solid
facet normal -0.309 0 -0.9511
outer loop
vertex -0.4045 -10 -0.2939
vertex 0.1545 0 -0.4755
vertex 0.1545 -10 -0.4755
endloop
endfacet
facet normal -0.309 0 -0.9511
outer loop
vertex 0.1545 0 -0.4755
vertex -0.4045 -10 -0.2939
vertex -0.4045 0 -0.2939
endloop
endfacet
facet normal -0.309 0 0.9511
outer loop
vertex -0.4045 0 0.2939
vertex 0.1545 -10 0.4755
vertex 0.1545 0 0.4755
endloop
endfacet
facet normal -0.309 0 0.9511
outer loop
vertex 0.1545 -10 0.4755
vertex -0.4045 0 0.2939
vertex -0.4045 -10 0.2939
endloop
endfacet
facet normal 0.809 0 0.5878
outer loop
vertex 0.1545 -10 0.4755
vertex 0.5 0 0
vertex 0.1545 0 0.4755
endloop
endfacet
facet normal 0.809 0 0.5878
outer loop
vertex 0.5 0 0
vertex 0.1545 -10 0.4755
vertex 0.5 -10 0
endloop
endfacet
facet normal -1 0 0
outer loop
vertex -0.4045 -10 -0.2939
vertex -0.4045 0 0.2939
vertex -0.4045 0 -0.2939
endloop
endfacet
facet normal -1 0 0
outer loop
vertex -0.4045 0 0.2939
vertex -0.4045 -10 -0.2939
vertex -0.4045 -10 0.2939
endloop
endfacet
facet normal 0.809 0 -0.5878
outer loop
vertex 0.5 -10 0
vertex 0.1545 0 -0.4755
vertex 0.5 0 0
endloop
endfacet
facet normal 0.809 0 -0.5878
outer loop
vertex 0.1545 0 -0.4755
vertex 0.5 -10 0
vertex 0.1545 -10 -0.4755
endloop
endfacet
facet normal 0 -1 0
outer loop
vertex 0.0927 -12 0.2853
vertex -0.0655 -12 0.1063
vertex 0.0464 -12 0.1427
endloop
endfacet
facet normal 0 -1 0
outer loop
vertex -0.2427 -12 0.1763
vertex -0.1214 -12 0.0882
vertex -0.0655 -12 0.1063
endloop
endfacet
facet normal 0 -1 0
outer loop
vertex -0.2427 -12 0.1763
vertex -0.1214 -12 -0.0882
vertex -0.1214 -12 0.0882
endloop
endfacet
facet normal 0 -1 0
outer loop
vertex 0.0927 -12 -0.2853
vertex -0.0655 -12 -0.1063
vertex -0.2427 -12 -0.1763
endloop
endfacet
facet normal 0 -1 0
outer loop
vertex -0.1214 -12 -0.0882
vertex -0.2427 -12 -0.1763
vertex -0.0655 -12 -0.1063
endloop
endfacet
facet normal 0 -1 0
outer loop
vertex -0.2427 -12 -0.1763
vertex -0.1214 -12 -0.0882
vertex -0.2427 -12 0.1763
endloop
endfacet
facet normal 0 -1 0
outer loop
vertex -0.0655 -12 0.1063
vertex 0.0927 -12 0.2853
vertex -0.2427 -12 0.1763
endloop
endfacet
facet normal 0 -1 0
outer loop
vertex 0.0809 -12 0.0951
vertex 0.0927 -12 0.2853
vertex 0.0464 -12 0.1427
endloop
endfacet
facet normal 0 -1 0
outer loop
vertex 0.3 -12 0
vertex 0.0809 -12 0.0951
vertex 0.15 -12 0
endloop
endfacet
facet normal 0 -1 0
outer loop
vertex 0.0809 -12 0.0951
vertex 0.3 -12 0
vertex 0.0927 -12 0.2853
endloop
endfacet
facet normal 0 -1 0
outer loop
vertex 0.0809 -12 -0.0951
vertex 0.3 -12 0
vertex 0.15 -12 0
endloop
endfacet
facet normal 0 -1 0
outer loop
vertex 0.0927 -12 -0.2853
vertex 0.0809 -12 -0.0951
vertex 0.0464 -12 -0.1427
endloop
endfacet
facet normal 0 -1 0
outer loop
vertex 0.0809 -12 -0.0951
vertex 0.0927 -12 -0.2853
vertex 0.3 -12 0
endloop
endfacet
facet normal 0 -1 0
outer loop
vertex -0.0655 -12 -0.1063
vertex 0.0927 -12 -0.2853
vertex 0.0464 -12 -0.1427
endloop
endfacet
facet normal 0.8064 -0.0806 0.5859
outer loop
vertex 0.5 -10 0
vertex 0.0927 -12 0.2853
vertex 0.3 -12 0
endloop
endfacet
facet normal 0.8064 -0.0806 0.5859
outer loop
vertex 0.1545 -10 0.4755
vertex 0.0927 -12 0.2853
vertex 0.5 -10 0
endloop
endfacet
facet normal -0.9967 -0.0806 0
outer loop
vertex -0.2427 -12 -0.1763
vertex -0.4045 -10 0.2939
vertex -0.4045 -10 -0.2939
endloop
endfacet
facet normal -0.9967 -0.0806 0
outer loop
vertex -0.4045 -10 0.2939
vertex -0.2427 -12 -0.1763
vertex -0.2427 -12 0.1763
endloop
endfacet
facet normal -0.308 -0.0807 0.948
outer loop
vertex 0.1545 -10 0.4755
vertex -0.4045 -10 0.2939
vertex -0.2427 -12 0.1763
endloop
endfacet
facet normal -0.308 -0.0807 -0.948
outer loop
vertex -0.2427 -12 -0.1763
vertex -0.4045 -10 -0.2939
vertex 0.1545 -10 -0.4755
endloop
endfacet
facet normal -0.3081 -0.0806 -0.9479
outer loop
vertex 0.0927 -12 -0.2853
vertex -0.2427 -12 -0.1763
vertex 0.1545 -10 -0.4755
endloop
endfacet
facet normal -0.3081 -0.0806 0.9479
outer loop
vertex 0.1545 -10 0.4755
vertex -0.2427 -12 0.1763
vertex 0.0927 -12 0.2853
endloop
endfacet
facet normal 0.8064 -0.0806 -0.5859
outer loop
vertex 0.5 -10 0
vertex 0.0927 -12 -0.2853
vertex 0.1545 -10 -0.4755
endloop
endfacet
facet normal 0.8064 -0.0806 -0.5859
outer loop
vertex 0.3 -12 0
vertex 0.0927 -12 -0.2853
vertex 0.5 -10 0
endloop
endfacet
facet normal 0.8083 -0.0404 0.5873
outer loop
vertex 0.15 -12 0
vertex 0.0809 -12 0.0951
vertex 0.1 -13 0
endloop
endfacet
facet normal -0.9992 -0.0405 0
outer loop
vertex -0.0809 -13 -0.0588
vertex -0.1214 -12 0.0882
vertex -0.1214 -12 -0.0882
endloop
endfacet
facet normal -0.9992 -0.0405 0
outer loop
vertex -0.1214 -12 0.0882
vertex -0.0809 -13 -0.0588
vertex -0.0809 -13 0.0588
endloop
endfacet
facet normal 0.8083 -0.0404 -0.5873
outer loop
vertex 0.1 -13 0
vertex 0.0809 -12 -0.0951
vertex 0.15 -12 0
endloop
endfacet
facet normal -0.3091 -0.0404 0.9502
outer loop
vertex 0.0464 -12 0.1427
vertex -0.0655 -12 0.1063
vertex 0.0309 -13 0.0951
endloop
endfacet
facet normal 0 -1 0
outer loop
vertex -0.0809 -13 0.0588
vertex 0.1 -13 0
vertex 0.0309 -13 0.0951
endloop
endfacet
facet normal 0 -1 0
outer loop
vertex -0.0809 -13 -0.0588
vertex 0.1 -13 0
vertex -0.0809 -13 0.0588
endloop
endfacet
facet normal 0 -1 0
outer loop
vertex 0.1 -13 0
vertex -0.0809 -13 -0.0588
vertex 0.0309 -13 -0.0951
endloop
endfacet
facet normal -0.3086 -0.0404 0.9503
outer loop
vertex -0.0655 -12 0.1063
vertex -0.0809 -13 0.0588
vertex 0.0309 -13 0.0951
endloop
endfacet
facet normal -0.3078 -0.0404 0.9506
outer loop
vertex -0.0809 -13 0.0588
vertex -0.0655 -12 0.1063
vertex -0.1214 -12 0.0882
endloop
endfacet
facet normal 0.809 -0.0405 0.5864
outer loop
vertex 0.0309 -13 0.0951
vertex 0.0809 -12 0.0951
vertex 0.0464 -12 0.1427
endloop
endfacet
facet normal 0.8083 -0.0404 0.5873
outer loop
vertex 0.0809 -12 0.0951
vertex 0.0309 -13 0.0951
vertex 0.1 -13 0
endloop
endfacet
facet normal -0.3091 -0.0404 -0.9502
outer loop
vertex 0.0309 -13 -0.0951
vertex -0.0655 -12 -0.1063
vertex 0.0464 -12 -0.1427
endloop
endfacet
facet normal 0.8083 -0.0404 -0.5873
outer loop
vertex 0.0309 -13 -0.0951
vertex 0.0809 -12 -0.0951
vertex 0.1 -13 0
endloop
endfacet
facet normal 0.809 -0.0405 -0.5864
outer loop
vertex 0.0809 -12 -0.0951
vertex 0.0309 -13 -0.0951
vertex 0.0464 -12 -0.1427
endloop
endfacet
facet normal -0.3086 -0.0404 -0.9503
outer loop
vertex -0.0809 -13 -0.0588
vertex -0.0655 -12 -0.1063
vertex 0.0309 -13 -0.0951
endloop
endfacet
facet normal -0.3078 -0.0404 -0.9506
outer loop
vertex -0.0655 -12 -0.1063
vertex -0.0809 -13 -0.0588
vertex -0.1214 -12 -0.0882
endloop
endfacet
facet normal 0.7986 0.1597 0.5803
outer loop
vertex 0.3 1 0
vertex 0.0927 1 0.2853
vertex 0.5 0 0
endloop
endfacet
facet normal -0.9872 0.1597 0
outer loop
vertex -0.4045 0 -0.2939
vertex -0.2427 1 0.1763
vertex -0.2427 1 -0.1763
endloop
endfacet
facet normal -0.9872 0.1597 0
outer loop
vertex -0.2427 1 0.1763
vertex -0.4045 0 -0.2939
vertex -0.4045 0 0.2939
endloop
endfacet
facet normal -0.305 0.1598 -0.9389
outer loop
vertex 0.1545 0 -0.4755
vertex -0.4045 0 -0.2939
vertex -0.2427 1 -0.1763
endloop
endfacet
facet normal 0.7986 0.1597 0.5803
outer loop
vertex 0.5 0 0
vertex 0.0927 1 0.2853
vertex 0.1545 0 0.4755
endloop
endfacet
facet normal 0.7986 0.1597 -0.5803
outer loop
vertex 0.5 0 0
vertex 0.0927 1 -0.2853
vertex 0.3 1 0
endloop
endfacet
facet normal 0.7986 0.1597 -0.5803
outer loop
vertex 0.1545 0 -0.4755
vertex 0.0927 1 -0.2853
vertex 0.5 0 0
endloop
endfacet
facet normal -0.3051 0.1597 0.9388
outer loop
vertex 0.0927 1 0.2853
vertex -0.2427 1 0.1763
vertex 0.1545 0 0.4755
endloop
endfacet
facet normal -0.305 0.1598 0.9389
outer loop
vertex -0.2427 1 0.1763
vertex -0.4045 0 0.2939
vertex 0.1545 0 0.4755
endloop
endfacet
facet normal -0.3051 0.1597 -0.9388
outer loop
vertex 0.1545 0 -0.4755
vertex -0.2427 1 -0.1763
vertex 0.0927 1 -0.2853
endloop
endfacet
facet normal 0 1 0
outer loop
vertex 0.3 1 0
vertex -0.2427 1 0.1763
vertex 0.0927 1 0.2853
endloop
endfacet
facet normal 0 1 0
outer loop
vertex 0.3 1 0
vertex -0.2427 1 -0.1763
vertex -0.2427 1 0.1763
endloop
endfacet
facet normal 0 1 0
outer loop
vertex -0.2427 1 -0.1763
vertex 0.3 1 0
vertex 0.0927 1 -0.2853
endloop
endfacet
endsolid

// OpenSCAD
rotate ([90,0,0]) {
color ([0,0.5,5])cylinder (10,0.5,0.5);

color ([0,0.5,5])translate ([0,0,10])cylinder (2,0.5,0.3);
color ([0.4,0.4,0.4])translate ([0,0,11])cylinder (2,0.2,0.1);
 color ([0,0.5,5]) translate ([0,0,-1])cylinder (1,0.3,0.5);
}
